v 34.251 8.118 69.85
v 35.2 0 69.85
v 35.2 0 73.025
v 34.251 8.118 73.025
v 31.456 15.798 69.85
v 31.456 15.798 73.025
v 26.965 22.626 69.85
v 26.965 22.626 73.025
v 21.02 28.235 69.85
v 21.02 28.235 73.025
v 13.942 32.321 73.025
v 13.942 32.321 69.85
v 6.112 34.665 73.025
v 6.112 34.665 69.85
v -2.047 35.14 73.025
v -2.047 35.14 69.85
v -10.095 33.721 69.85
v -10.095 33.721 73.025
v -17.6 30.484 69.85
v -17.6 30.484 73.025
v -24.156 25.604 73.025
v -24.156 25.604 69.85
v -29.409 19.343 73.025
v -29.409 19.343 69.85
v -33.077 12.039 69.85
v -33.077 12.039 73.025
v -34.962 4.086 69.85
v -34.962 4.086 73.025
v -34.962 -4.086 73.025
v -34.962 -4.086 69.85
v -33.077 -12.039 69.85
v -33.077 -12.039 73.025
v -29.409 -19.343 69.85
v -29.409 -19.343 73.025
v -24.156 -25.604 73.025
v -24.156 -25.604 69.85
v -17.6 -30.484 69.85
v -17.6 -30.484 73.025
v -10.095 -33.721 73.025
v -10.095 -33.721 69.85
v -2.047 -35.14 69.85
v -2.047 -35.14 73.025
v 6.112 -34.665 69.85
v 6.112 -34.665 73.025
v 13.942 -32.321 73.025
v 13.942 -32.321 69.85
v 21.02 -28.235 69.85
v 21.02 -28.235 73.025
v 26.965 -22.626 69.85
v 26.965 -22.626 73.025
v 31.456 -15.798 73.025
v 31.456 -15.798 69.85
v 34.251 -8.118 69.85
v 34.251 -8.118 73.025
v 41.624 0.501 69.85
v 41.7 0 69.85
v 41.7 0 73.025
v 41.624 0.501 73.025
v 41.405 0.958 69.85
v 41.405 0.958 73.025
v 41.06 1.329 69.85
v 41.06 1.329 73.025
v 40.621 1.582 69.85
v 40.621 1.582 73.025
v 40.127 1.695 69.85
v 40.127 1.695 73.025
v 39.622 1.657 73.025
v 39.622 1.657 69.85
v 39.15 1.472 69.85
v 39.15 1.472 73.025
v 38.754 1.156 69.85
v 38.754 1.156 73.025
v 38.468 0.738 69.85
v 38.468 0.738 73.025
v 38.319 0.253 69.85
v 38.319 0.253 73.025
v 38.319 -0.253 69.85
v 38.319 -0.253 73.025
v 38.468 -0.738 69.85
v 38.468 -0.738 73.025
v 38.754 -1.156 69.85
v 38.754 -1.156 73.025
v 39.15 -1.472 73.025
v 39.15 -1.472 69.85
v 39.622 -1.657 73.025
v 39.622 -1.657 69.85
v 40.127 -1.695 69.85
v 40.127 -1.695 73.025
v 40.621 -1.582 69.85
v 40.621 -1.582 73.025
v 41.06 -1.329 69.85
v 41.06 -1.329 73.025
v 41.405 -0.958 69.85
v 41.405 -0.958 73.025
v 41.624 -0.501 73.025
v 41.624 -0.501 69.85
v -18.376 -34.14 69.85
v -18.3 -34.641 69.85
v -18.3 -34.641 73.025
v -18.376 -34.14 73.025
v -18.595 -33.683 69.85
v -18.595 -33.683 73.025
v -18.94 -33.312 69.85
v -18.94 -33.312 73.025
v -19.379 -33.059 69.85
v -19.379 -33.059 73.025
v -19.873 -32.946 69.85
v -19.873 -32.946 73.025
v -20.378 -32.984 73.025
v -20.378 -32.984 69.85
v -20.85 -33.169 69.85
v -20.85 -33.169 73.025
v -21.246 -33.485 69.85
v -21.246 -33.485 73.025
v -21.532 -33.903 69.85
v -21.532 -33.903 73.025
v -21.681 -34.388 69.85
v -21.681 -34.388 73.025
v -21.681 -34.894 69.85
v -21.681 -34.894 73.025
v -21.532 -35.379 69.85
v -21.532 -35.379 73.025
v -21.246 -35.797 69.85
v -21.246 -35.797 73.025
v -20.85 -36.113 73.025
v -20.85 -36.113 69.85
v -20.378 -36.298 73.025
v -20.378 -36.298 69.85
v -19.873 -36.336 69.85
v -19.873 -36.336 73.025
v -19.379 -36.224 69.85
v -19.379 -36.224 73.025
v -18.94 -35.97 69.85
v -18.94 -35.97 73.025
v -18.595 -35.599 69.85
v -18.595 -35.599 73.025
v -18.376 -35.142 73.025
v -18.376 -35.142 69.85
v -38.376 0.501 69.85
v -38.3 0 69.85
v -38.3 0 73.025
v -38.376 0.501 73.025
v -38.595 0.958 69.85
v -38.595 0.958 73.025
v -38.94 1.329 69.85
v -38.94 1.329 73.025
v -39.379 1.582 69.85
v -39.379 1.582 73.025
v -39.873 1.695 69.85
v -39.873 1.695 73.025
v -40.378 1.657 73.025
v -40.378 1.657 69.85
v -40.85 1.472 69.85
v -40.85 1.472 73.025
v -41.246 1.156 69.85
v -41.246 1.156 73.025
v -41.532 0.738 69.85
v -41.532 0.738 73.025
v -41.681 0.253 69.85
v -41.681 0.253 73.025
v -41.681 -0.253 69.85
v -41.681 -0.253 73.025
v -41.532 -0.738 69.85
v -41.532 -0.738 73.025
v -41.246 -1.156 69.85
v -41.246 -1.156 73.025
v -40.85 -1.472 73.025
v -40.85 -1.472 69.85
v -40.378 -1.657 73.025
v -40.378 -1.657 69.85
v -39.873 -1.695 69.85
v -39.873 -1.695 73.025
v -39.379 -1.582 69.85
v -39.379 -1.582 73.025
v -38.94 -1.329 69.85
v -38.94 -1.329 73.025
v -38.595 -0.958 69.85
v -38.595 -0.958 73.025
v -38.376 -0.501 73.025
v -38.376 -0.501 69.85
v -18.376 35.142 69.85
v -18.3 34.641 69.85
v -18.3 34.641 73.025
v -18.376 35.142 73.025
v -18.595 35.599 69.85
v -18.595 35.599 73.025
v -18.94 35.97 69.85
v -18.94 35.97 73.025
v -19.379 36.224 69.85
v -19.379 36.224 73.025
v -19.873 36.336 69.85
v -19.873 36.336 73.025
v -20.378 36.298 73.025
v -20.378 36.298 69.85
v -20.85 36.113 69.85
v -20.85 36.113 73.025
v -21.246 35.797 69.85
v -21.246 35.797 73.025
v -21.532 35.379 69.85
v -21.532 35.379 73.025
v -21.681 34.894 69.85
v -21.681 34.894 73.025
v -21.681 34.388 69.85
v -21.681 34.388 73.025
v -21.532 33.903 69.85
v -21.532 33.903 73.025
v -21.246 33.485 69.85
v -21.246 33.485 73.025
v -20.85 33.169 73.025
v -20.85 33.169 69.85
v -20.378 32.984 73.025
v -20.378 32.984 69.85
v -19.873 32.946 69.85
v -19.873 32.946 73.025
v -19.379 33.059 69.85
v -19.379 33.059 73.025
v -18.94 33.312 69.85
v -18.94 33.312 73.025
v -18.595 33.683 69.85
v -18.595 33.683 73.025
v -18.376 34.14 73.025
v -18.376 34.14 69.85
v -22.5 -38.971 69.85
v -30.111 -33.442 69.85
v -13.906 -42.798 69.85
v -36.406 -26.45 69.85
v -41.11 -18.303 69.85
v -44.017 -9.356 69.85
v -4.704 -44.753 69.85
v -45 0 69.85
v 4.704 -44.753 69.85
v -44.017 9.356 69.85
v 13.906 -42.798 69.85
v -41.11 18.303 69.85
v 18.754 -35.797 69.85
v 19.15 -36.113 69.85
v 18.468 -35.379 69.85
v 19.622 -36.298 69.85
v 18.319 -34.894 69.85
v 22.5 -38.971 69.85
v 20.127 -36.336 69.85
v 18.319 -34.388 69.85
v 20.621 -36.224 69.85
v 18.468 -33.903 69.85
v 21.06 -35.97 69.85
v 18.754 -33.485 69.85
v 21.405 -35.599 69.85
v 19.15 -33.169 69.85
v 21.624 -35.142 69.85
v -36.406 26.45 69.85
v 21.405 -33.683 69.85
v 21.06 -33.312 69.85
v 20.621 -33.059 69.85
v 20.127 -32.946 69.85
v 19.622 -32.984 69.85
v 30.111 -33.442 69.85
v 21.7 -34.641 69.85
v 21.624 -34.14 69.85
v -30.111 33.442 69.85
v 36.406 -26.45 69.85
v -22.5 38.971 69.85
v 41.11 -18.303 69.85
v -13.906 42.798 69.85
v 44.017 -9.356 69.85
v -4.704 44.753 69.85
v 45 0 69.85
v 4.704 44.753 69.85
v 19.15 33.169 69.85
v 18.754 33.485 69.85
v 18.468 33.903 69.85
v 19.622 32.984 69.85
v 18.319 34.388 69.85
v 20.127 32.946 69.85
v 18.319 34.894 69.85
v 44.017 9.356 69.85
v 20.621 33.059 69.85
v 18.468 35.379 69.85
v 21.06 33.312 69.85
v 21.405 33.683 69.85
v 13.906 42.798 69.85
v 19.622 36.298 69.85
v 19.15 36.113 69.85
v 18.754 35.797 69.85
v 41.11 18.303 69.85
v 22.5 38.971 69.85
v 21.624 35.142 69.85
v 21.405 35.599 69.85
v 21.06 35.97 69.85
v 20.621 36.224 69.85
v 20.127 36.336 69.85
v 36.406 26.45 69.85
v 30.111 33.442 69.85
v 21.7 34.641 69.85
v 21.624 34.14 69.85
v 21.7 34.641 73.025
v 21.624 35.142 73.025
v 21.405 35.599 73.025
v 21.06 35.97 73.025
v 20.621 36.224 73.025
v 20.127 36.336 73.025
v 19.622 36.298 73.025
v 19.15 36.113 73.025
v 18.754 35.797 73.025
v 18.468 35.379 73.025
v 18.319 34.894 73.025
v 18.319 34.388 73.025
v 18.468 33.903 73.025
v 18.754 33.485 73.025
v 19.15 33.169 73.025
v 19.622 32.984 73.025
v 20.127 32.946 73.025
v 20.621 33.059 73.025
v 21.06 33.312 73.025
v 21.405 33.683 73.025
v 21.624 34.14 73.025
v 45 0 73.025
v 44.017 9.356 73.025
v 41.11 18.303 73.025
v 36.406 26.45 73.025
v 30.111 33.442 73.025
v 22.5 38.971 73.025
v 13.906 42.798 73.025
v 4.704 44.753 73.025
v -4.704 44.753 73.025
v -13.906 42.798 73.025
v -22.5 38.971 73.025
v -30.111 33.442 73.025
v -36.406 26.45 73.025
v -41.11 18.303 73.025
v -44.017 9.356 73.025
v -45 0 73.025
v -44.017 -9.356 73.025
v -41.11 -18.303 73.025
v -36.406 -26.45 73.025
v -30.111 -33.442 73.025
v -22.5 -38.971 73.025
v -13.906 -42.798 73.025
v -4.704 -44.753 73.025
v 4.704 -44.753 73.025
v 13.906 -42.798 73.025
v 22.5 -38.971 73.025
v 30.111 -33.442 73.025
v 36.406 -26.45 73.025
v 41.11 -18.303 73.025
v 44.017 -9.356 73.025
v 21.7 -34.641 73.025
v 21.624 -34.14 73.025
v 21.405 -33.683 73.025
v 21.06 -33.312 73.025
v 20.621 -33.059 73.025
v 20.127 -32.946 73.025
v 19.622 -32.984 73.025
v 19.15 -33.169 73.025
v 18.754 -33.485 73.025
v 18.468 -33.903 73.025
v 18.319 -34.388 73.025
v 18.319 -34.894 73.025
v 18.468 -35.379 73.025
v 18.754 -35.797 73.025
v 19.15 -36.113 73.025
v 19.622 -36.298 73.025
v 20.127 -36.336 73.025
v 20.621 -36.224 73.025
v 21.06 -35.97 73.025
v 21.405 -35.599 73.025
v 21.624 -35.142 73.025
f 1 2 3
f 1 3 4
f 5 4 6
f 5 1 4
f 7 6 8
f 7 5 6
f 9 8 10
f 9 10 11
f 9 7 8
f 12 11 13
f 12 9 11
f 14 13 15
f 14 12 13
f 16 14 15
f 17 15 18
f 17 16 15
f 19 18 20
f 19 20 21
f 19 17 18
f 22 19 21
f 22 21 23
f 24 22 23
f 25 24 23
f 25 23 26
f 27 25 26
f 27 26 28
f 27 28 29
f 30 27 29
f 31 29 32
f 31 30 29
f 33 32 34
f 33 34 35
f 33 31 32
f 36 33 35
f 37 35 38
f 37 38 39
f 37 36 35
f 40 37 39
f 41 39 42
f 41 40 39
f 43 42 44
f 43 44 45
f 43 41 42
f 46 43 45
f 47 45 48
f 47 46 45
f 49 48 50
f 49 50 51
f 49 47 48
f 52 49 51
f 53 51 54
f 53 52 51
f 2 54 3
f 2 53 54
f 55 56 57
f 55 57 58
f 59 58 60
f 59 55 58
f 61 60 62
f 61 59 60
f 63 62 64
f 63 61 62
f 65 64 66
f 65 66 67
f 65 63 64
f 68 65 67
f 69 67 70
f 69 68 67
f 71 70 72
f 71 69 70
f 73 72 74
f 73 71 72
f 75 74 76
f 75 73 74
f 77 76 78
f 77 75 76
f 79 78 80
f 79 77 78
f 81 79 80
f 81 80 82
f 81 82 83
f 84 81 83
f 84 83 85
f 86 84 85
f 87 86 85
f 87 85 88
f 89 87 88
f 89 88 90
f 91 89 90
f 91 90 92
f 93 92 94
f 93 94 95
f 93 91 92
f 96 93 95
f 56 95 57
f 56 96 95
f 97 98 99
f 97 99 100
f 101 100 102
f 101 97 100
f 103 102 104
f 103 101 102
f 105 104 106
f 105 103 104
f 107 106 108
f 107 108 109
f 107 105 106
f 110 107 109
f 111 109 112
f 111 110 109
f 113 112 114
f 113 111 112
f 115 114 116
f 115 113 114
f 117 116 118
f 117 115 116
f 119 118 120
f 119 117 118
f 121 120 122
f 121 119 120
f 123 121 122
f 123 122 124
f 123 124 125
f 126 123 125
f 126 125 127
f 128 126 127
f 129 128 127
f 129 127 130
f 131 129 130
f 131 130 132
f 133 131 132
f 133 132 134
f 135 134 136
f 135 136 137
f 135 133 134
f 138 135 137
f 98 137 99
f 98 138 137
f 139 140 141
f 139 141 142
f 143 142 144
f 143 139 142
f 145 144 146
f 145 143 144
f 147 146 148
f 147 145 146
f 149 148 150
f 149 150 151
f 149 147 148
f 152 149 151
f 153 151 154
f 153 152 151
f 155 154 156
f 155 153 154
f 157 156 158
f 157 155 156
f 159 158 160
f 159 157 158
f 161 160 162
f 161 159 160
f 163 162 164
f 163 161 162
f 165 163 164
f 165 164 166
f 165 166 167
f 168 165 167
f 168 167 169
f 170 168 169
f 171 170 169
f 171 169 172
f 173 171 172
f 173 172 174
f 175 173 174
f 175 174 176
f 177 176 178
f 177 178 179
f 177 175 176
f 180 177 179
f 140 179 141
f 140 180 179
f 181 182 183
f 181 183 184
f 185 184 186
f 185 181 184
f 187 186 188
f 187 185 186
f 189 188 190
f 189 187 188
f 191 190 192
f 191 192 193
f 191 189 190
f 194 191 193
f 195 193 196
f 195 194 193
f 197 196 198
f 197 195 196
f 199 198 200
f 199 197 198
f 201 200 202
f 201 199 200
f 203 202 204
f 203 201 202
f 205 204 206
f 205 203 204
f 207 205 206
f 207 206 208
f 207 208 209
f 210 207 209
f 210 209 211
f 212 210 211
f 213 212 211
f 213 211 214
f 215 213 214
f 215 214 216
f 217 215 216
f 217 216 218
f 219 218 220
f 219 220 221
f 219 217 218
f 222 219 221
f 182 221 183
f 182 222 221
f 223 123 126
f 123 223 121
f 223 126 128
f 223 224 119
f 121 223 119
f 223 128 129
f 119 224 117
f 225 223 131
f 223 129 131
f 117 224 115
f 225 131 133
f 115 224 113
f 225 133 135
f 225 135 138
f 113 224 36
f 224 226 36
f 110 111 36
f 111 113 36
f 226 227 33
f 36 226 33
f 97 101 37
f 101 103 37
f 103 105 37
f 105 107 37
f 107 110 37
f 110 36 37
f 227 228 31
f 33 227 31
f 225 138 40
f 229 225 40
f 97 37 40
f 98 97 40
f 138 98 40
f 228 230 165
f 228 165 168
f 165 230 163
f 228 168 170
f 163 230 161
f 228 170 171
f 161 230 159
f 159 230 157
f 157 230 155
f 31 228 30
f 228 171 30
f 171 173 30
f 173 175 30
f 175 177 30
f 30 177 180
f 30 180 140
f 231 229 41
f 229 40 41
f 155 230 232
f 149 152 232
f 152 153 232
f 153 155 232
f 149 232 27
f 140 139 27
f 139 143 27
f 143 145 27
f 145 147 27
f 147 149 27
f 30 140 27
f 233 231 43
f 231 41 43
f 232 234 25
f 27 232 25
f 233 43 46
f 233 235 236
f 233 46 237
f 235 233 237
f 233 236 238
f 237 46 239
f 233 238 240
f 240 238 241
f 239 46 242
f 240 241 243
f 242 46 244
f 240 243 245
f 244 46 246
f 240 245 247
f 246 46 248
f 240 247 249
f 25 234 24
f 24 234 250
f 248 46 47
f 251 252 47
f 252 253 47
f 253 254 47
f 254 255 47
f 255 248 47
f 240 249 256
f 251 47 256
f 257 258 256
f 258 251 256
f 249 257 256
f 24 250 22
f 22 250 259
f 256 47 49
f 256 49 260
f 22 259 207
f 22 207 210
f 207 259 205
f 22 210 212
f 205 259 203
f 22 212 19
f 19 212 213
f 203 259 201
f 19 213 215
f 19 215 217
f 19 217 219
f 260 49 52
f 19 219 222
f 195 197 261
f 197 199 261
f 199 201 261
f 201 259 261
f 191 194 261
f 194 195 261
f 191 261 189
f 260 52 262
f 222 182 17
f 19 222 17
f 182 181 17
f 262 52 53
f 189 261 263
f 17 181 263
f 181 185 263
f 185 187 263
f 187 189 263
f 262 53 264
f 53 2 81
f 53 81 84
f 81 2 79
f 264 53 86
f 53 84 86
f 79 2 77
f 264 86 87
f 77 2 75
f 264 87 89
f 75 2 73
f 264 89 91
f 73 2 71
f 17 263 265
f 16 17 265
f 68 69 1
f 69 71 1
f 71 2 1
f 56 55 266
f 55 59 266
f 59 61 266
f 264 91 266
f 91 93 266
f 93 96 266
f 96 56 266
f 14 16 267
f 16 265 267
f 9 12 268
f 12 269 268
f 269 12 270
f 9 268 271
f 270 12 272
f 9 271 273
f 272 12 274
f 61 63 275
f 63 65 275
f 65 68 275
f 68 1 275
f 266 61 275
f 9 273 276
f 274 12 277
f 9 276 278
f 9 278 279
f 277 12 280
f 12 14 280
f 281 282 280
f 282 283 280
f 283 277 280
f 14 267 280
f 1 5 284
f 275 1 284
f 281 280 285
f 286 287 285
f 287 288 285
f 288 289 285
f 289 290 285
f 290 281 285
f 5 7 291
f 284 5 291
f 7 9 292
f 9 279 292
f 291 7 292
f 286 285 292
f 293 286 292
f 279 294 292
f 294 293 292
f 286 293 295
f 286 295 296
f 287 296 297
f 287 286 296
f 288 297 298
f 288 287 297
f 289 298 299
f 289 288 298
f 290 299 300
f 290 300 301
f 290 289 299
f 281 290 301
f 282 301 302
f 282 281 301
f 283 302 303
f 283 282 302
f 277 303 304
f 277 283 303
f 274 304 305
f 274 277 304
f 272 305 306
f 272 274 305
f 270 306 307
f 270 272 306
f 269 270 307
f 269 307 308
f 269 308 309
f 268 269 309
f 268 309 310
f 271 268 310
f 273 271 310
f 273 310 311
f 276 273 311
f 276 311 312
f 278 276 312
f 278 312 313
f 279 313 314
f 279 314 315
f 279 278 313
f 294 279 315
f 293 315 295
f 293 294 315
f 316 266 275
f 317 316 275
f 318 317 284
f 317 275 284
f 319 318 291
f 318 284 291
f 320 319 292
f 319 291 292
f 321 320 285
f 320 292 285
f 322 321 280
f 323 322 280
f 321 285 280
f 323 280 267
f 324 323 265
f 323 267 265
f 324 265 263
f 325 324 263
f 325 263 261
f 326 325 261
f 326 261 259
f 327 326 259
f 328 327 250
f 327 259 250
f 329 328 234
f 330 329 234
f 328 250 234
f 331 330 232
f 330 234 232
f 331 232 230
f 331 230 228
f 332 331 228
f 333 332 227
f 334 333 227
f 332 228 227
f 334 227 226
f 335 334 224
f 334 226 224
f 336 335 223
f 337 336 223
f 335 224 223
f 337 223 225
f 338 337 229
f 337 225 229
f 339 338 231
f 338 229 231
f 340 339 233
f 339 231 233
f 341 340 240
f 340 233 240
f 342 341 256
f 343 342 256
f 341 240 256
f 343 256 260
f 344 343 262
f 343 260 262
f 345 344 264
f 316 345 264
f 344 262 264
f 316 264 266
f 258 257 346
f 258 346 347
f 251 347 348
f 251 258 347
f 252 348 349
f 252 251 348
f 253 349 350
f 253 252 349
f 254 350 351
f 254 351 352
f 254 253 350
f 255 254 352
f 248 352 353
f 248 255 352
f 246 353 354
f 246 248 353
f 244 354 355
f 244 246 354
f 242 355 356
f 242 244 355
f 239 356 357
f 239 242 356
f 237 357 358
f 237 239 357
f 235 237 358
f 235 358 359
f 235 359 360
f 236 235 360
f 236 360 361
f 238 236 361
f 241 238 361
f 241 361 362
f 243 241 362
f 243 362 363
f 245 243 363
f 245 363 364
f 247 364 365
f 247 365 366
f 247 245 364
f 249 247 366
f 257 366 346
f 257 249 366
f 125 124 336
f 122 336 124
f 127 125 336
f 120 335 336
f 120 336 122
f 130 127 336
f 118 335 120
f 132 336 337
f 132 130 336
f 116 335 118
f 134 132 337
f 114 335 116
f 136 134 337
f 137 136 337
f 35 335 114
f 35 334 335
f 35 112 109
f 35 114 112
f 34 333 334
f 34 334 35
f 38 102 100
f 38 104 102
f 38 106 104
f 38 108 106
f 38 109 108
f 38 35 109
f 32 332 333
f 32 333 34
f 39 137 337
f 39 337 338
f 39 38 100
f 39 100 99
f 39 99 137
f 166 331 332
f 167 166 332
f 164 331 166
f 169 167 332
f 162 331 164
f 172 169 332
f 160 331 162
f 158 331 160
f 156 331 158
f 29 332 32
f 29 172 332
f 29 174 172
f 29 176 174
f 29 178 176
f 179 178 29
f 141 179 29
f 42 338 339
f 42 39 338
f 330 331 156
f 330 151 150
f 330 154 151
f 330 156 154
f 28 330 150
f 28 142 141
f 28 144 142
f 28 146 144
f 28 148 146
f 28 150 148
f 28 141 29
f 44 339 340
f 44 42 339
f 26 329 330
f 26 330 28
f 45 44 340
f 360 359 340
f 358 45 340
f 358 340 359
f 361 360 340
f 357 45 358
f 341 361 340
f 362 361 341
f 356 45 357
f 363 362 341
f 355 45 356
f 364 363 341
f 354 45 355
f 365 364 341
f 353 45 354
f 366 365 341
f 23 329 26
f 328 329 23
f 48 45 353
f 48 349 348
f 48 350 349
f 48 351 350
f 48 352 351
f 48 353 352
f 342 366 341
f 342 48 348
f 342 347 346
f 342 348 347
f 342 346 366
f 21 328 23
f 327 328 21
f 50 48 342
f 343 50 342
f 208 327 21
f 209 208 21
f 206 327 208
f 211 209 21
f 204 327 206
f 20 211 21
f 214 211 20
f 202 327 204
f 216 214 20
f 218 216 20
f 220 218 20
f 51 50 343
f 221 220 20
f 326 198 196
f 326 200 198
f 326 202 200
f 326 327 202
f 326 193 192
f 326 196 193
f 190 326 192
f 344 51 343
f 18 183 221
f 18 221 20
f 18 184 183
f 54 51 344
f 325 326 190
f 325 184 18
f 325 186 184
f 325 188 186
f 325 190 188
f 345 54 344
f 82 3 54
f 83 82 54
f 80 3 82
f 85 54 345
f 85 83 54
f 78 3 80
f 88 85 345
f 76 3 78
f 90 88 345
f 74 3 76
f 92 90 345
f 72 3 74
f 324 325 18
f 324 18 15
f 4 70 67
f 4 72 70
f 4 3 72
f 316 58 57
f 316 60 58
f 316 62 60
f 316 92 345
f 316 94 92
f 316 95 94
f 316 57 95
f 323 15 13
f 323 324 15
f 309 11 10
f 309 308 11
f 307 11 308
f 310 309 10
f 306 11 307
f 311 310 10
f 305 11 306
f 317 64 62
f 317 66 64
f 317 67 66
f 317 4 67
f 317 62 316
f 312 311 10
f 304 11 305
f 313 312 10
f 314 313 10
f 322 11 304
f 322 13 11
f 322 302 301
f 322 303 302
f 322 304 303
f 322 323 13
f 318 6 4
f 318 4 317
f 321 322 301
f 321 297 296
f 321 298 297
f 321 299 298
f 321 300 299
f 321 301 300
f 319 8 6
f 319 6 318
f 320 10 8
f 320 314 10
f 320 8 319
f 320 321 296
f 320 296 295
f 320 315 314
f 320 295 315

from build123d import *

# Parameters (mm, degrees)
ARO_START         = 69.85
CROQUIS1_R        = 45
CROQUIS1_R_2      = 35.2
ARO_DEPTH         = 3.175
BARRENOS_M3_START = 69.85
CROQUIS2_R        = 1.7
BARRENOS_M3_DEPTH = 3.175


with BuildPart() as part:
    # Croquis1 → Aro (new body)
    with BuildSketch(Plane.XY.offset(ARO_START)):
        Circle(CROQUIS1_R)
        Circle(CROQUIS1_R_2, mode=Mode.SUBTRACT)
    extrude(amount=ARO_DEPTH)

    # Croquis2 → Barrenos_M3 (cut)
    with BuildSketch(Plane.XY.offset(BARRENOS_M3_START)):
        with Locations((40, 0)):
            Circle(CROQUIS2_R)
        with Locations((20, 34.641016151)):
            Circle(CROQUIS2_R)
        with Locations((-20, 34.641016151)):
            Circle(CROQUIS2_R)
        with Locations((-40, 0)):
            Circle(CROQUIS2_R)
        with Locations((-20, -34.641016151)):
            Circle(CROQUIS2_R)
        with Locations((20, -34.641016151)):
            Circle(CROQUIS2_R)
    extrude(amount=BARRENOS_M3_DEPTH, mode=Mode.SUBTRACT)


solid = part.part
